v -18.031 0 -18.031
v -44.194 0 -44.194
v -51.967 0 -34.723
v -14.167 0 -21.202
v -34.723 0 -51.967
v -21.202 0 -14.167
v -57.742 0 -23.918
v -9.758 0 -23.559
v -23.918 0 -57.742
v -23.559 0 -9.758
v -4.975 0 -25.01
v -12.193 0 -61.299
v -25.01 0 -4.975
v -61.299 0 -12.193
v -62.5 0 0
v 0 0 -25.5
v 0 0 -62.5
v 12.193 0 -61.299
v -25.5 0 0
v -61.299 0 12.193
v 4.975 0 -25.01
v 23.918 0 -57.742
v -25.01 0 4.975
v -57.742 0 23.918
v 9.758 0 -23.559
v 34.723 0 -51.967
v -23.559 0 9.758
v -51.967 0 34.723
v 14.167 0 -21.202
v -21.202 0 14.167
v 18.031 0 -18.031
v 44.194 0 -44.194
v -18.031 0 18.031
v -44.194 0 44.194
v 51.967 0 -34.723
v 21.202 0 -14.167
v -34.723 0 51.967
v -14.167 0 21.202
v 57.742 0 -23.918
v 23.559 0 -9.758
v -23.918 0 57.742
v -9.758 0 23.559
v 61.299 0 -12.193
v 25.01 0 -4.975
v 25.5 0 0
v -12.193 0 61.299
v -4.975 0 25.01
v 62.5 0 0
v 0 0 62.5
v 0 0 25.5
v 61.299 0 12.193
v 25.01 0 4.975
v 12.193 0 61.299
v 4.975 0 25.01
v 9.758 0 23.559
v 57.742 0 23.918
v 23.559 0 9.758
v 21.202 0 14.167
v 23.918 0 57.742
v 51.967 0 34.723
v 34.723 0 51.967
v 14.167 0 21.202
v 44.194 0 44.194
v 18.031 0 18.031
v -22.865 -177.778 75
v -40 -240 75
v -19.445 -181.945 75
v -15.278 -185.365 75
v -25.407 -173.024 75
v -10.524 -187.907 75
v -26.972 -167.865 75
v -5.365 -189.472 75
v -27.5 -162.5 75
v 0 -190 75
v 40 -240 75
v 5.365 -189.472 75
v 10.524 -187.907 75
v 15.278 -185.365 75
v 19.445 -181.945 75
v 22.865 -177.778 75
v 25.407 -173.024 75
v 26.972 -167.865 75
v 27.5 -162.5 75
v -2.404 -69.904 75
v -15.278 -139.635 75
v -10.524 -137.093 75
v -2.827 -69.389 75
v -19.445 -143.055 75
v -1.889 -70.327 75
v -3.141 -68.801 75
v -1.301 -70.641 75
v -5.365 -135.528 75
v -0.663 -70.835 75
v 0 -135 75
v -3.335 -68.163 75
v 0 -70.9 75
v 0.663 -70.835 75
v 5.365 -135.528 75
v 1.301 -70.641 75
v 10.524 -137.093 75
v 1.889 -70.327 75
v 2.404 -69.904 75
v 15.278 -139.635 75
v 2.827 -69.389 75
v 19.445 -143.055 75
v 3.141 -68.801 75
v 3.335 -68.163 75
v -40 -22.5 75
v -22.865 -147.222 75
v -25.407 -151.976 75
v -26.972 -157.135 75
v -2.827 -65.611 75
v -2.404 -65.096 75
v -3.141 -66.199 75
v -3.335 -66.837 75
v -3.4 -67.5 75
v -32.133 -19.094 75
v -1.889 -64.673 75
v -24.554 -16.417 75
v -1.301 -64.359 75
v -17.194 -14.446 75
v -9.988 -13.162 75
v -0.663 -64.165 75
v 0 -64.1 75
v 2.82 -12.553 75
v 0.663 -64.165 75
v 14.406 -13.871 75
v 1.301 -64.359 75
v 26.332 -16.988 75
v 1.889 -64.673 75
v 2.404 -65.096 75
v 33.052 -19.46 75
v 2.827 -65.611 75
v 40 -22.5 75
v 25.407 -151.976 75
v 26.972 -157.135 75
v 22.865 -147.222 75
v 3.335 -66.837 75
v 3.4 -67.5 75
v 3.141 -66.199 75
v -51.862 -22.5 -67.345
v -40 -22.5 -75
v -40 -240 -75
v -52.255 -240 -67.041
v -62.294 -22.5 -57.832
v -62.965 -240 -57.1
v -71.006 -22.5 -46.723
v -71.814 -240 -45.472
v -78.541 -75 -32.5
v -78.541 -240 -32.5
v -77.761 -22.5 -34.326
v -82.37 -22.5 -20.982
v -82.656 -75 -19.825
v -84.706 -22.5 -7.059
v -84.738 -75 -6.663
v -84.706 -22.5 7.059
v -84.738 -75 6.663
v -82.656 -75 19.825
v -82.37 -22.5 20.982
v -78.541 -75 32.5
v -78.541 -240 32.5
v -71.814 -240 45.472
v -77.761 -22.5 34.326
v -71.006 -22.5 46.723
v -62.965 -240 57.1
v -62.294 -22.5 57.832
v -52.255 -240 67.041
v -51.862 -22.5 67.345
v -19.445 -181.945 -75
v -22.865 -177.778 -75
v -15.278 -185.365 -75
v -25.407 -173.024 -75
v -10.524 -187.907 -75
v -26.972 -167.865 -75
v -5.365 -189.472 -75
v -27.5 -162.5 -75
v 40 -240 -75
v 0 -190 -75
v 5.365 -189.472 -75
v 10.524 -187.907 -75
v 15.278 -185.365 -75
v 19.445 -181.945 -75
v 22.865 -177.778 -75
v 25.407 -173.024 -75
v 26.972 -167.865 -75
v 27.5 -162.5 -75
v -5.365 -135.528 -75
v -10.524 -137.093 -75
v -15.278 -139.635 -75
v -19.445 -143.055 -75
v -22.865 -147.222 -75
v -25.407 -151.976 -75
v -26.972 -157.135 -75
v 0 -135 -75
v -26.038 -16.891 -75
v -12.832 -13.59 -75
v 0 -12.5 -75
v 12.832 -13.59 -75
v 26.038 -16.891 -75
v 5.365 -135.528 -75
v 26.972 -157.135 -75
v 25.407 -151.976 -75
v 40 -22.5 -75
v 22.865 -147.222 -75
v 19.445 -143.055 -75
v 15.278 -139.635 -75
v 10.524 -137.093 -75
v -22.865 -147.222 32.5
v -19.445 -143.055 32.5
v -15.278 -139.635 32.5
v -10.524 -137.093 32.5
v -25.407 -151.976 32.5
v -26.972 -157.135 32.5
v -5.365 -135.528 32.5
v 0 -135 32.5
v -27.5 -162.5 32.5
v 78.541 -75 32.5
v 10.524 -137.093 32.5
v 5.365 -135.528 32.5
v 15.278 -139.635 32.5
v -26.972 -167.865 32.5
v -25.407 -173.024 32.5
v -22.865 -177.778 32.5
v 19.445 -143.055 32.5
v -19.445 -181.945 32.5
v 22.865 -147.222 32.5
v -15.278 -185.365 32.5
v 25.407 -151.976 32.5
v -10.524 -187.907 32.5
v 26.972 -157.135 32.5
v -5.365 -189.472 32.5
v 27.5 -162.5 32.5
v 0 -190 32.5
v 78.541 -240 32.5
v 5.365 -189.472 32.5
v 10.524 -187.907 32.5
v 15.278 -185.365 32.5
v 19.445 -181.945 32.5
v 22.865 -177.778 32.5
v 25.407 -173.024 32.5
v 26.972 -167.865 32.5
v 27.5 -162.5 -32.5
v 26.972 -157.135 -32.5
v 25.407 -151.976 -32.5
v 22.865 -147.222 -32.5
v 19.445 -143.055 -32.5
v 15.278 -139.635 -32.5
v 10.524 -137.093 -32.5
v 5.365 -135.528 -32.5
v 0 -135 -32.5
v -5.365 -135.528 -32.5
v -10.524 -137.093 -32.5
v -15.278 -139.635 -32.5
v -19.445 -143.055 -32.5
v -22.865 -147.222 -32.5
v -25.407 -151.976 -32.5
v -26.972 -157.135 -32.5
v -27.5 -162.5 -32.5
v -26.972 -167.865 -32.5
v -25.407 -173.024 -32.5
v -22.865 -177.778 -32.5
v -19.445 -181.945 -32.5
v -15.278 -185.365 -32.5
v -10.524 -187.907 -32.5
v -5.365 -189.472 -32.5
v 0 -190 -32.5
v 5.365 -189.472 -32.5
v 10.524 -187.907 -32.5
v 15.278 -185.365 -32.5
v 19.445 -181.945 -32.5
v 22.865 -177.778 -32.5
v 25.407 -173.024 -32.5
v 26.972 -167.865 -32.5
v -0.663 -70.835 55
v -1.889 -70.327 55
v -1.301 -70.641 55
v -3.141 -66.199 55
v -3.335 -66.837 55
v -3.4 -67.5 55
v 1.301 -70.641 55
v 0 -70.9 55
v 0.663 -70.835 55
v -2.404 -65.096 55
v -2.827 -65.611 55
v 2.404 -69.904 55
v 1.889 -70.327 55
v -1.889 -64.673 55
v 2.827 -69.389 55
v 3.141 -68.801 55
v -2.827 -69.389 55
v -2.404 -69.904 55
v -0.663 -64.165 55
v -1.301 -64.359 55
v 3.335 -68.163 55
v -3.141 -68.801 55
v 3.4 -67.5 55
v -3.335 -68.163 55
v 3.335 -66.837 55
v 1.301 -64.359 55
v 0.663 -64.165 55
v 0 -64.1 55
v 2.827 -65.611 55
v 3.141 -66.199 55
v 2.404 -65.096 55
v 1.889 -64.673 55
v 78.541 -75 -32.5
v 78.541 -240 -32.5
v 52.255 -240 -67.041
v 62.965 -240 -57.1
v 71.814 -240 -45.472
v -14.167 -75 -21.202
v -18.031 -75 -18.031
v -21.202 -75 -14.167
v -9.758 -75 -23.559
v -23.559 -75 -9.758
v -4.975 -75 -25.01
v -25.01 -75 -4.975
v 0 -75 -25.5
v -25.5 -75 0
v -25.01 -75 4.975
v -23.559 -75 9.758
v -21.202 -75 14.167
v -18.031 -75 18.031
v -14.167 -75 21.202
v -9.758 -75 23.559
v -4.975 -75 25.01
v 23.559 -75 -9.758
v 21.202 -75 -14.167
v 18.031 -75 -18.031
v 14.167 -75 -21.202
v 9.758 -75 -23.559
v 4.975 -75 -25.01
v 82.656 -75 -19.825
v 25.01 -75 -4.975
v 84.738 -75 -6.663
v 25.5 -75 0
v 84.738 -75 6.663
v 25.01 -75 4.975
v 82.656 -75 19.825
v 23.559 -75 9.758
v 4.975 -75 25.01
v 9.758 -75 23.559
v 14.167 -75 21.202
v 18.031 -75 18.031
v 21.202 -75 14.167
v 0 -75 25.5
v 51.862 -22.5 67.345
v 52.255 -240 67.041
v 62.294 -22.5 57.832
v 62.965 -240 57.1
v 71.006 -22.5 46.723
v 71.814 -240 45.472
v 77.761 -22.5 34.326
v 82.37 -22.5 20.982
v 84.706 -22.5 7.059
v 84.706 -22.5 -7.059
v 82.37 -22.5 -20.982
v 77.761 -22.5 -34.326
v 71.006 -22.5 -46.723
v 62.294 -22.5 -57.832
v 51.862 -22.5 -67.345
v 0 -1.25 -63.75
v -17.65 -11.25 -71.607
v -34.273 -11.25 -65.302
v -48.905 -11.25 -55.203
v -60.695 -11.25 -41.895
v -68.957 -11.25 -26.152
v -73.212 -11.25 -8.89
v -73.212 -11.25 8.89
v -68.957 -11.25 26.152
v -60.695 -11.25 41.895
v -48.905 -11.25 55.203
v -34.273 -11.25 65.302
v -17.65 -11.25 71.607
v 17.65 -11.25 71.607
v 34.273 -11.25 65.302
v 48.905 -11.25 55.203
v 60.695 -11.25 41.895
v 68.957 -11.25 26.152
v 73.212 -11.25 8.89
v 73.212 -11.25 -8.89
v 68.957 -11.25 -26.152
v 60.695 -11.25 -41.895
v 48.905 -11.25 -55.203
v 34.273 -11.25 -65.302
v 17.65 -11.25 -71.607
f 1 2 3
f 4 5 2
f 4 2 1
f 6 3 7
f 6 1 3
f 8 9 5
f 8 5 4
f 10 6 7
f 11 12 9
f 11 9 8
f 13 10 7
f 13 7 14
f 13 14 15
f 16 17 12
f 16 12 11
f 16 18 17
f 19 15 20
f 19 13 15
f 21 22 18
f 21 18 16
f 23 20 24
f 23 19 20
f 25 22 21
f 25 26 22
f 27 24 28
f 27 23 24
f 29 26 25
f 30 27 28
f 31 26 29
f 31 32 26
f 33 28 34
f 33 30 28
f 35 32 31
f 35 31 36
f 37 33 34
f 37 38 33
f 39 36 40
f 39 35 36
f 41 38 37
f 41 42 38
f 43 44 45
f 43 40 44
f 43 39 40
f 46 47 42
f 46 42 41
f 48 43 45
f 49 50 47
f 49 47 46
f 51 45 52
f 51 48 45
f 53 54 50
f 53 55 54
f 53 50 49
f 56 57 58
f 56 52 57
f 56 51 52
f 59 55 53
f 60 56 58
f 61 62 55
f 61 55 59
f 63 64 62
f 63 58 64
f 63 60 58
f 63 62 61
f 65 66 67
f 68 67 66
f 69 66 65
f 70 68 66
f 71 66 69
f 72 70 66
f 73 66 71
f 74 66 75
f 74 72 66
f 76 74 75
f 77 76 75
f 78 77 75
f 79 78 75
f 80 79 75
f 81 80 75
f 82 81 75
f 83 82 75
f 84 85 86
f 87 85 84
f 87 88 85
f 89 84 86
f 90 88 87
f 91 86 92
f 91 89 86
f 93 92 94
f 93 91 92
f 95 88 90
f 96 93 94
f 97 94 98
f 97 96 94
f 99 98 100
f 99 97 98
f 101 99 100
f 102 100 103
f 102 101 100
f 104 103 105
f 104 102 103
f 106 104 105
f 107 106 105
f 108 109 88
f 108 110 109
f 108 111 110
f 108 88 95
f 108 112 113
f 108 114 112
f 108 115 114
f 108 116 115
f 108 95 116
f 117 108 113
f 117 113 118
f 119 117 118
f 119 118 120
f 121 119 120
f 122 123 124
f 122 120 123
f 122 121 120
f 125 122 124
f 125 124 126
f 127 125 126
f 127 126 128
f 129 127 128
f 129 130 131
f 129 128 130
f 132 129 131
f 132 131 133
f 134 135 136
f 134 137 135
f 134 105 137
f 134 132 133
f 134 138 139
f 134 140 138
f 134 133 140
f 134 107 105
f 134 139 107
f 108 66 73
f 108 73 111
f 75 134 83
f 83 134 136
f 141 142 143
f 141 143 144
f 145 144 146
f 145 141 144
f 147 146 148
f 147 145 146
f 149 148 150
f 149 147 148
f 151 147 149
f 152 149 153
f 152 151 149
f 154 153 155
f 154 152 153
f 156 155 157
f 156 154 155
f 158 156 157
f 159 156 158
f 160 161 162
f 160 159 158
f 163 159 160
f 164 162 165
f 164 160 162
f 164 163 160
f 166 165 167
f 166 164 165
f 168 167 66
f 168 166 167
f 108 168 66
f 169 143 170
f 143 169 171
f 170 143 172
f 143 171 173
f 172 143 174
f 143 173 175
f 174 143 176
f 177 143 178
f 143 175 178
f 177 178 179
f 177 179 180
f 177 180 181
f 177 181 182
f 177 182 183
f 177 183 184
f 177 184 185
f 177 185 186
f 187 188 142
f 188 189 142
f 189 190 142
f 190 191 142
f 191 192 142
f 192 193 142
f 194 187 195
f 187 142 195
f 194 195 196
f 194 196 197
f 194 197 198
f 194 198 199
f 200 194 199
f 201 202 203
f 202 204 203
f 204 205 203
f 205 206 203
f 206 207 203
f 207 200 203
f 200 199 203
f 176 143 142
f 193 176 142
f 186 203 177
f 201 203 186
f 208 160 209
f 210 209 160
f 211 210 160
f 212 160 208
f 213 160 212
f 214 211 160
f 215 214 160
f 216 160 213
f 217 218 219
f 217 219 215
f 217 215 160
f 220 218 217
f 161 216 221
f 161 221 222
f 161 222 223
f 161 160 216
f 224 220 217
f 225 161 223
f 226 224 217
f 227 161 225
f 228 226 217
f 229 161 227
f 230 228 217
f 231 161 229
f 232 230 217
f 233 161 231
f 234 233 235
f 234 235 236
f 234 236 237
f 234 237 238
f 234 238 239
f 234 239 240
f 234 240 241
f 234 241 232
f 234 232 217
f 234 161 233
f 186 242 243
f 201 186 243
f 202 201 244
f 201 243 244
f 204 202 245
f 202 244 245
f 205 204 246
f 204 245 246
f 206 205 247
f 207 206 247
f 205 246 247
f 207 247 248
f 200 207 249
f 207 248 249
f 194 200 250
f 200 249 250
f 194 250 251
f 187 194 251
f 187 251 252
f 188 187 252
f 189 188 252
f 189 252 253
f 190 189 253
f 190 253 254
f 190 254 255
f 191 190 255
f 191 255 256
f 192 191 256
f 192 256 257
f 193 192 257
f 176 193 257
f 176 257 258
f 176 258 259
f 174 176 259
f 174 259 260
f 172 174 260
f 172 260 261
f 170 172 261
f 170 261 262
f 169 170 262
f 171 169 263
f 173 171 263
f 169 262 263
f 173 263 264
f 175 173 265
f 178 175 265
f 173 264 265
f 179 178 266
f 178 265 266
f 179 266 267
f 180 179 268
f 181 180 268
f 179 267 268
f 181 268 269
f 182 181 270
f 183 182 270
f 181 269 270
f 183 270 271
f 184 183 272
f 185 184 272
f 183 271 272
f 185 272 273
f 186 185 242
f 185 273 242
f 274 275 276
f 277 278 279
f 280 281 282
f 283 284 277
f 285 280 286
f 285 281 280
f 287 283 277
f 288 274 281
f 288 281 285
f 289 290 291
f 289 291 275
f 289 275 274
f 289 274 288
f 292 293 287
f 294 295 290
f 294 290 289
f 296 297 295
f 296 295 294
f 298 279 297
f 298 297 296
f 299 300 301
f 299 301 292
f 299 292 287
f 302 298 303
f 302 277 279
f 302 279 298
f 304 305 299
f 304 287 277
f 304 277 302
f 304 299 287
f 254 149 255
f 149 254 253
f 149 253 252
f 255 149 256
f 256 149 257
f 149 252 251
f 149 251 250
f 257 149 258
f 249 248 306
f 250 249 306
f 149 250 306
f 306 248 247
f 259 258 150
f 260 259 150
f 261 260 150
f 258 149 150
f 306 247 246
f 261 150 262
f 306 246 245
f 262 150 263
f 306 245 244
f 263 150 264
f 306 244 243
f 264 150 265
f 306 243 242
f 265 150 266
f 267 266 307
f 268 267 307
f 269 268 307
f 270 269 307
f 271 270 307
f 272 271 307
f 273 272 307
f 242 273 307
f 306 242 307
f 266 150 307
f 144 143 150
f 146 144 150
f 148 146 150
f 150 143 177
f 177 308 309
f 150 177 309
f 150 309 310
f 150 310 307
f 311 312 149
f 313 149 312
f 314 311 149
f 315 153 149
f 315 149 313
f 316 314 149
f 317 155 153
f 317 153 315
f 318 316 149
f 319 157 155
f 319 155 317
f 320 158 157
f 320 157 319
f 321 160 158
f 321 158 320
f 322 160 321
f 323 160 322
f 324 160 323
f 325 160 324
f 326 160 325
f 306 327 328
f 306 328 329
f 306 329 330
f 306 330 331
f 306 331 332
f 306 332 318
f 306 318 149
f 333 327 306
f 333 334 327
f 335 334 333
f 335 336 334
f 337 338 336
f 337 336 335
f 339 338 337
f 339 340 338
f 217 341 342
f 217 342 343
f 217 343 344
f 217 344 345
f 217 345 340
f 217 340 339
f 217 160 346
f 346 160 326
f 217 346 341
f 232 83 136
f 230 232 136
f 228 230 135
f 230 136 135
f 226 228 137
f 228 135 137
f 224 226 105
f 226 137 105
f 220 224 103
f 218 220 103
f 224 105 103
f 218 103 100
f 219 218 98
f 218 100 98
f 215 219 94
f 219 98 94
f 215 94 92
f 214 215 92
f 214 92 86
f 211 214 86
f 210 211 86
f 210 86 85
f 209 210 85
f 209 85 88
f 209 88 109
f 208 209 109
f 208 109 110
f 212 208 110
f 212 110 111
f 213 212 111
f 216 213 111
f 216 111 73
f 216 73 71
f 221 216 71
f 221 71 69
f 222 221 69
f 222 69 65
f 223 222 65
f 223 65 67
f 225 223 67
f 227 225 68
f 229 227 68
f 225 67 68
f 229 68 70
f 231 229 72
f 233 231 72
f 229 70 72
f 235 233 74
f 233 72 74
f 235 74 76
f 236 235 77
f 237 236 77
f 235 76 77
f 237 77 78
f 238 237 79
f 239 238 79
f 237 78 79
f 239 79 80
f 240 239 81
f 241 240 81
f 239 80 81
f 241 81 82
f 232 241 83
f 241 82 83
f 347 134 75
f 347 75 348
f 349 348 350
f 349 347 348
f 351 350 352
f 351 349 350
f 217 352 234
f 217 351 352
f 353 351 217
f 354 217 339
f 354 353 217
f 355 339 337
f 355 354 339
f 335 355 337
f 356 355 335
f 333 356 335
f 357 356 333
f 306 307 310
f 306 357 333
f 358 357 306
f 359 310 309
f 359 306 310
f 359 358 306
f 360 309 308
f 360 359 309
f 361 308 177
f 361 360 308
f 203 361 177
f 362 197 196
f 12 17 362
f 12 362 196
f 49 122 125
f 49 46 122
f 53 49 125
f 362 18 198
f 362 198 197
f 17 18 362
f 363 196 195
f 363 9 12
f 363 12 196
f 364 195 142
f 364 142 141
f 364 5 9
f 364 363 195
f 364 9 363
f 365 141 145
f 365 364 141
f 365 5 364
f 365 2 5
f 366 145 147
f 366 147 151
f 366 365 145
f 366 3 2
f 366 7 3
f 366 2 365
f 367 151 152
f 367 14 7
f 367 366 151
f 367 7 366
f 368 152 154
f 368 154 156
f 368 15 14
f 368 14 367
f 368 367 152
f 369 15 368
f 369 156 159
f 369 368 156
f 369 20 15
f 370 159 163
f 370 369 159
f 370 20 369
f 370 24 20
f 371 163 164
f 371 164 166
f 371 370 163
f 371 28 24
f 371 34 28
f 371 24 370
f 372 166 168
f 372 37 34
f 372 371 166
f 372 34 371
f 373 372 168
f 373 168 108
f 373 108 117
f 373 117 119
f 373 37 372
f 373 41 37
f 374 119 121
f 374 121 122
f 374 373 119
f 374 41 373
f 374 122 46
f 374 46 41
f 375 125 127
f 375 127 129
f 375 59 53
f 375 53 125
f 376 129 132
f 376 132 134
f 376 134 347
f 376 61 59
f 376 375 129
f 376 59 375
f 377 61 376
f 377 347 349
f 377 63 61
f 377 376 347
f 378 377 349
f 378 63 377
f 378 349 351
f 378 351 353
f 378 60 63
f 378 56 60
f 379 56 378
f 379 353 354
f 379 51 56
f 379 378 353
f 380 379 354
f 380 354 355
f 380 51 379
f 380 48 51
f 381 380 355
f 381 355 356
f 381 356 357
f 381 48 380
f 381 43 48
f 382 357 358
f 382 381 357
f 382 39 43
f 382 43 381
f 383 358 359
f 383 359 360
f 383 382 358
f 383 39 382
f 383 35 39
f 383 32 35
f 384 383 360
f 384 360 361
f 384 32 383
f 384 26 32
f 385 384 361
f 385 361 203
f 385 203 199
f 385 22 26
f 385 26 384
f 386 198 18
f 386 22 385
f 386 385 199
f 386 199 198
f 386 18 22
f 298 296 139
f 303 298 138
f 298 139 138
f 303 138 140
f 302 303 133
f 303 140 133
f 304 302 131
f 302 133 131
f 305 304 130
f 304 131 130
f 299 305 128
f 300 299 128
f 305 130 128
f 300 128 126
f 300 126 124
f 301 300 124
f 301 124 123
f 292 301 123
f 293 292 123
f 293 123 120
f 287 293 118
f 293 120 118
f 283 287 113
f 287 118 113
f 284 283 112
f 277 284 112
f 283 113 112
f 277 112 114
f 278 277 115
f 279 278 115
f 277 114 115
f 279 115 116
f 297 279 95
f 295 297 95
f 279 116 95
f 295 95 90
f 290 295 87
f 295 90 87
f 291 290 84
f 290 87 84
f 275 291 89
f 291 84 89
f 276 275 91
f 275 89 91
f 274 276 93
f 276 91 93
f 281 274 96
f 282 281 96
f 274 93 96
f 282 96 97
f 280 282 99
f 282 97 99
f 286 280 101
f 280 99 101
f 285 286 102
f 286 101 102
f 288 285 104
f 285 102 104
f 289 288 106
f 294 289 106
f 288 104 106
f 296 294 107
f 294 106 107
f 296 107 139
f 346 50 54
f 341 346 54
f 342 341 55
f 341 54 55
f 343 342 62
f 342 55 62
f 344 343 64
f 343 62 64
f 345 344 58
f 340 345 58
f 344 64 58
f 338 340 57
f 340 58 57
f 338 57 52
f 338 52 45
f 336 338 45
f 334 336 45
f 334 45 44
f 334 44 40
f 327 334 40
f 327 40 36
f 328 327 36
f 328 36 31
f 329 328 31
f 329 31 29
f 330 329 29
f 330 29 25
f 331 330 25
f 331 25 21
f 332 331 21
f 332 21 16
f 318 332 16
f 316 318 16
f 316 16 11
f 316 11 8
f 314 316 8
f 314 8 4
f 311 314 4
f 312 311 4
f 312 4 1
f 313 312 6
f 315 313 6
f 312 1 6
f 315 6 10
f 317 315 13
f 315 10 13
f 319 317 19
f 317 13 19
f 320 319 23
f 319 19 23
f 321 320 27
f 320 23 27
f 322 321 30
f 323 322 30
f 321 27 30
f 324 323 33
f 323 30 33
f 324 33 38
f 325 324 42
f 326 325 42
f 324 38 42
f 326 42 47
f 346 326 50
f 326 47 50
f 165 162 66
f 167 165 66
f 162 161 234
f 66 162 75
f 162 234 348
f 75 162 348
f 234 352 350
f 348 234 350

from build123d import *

# Parameters (mm, degrees)
SKETCH_1_R          = 85
EXTRUDE_1_DEPTH     = 240
SKETCH_2_W          = 162
SKETCH_2_H          = 14
CUT_EXTRUDE_1_DEPTH = 269.421310629
SKETCH_5_W          = 188
SKETCH_5_H          = 65
CUT_EXTRUDE_2_DEPTH = 165
SKETCH_6_R          = 27.5
CUT_EXTRUDE_3_DEPTH = 296.508037116
SKETCH_6_3_R        = 3.4
CUT_EXTRUDE_4_DEPTH = 20
CUT_EXTRUDE_5_REACH = 267.424
SKETCH_8_R          = 25.5


with BuildPart() as part:
    # 草图1 → 凸台-拉伸1 (new body)
    with BuildSketch(Plane(origin=(0, 0, 0), x_dir=(1, 0, 0), z_dir=(0, 1, 0))):
        Circle(SKETCH_1_R)
    extrude(amount=-EXTRUDE_1_DEPTH)

    # 草图2 → 切除-拉伸1 (cut, through all)
    with BuildSketch(Plane(origin=(0, 0, 0), x_dir=(1, 0, 0), z_dir=(0, 1, 0))):
        with Locations((1.586849721, 82)):
            Rectangle(SKETCH_2_W, SKETCH_2_H)
    cut_extrude_1 = extrude(amount=-CUT_EXTRUDE_1_DEPTH, mode=Mode.SUBTRACT)

    # 镜向1: 切除-拉伸1 across plane
    add(cut_extrude_1.mirror(Plane.XY), mode=Mode.SUBTRACT)

    # 草图3 → 切除-旋转1 (revolve, cut)
    with BuildSketch(Plane.XY):
        Polygon((85, -22.5), (62.5, 0), (85, 0), align=None)
    revolve(axis=Axis((0, -240, 0), (0, 1, 0)), mode=Mode.SUBTRACT)

    # 草图5 → 切除-拉伸2 (cut)
    with BuildSketch(Plane.XZ.offset(240)):
        Rectangle(SKETCH_5_W, SKETCH_5_H)
    extrude(amount=-CUT_EXTRUDE_2_DEPTH, mode=Mode.SUBTRACT)

    # 草图6 → 切除-拉伸3 (cut, through all)
    with BuildSketch(Plane.XY.offset(75)):
        with Locations((0, -162.5)):
            Circle(SKETCH_6_R)
    extrude(amount=-CUT_EXTRUDE_3_DEPTH, mode=Mode.SUBTRACT)

    # 草图6<3> → 切除-拉伸4 (cut)
    with BuildSketch(Plane.XY.offset(75)):
        with Locations((0, -67.5)):
            Circle(SKETCH_6_3_R)
    extrude(amount=-CUT_EXTRUDE_4_DEPTH, mode=Mode.SUBTRACT)

    # 草图8 → 切除-拉伸5 (cut, up to next)
    with BuildSketch(Plane(origin=(0, 0, 0), x_dir=(1, 0, 0), z_dir=(0, 1, 0)), mode=Mode.PRIVATE) as cut_extrude_5_sk1:
        Circle(SKETCH_8_R)
    cut_extrude_5_tool1 = extrude(cut_extrude_5_sk1.sketch, amount=-CUT_EXTRUDE_5_REACH, mode=Mode.PRIVATE) & part.part
    add(cut_extrude_5_tool1.solids().sort_by_distance((0, 0, 0))[0], mode=Mode.SUBTRACT)


solid = part.part
